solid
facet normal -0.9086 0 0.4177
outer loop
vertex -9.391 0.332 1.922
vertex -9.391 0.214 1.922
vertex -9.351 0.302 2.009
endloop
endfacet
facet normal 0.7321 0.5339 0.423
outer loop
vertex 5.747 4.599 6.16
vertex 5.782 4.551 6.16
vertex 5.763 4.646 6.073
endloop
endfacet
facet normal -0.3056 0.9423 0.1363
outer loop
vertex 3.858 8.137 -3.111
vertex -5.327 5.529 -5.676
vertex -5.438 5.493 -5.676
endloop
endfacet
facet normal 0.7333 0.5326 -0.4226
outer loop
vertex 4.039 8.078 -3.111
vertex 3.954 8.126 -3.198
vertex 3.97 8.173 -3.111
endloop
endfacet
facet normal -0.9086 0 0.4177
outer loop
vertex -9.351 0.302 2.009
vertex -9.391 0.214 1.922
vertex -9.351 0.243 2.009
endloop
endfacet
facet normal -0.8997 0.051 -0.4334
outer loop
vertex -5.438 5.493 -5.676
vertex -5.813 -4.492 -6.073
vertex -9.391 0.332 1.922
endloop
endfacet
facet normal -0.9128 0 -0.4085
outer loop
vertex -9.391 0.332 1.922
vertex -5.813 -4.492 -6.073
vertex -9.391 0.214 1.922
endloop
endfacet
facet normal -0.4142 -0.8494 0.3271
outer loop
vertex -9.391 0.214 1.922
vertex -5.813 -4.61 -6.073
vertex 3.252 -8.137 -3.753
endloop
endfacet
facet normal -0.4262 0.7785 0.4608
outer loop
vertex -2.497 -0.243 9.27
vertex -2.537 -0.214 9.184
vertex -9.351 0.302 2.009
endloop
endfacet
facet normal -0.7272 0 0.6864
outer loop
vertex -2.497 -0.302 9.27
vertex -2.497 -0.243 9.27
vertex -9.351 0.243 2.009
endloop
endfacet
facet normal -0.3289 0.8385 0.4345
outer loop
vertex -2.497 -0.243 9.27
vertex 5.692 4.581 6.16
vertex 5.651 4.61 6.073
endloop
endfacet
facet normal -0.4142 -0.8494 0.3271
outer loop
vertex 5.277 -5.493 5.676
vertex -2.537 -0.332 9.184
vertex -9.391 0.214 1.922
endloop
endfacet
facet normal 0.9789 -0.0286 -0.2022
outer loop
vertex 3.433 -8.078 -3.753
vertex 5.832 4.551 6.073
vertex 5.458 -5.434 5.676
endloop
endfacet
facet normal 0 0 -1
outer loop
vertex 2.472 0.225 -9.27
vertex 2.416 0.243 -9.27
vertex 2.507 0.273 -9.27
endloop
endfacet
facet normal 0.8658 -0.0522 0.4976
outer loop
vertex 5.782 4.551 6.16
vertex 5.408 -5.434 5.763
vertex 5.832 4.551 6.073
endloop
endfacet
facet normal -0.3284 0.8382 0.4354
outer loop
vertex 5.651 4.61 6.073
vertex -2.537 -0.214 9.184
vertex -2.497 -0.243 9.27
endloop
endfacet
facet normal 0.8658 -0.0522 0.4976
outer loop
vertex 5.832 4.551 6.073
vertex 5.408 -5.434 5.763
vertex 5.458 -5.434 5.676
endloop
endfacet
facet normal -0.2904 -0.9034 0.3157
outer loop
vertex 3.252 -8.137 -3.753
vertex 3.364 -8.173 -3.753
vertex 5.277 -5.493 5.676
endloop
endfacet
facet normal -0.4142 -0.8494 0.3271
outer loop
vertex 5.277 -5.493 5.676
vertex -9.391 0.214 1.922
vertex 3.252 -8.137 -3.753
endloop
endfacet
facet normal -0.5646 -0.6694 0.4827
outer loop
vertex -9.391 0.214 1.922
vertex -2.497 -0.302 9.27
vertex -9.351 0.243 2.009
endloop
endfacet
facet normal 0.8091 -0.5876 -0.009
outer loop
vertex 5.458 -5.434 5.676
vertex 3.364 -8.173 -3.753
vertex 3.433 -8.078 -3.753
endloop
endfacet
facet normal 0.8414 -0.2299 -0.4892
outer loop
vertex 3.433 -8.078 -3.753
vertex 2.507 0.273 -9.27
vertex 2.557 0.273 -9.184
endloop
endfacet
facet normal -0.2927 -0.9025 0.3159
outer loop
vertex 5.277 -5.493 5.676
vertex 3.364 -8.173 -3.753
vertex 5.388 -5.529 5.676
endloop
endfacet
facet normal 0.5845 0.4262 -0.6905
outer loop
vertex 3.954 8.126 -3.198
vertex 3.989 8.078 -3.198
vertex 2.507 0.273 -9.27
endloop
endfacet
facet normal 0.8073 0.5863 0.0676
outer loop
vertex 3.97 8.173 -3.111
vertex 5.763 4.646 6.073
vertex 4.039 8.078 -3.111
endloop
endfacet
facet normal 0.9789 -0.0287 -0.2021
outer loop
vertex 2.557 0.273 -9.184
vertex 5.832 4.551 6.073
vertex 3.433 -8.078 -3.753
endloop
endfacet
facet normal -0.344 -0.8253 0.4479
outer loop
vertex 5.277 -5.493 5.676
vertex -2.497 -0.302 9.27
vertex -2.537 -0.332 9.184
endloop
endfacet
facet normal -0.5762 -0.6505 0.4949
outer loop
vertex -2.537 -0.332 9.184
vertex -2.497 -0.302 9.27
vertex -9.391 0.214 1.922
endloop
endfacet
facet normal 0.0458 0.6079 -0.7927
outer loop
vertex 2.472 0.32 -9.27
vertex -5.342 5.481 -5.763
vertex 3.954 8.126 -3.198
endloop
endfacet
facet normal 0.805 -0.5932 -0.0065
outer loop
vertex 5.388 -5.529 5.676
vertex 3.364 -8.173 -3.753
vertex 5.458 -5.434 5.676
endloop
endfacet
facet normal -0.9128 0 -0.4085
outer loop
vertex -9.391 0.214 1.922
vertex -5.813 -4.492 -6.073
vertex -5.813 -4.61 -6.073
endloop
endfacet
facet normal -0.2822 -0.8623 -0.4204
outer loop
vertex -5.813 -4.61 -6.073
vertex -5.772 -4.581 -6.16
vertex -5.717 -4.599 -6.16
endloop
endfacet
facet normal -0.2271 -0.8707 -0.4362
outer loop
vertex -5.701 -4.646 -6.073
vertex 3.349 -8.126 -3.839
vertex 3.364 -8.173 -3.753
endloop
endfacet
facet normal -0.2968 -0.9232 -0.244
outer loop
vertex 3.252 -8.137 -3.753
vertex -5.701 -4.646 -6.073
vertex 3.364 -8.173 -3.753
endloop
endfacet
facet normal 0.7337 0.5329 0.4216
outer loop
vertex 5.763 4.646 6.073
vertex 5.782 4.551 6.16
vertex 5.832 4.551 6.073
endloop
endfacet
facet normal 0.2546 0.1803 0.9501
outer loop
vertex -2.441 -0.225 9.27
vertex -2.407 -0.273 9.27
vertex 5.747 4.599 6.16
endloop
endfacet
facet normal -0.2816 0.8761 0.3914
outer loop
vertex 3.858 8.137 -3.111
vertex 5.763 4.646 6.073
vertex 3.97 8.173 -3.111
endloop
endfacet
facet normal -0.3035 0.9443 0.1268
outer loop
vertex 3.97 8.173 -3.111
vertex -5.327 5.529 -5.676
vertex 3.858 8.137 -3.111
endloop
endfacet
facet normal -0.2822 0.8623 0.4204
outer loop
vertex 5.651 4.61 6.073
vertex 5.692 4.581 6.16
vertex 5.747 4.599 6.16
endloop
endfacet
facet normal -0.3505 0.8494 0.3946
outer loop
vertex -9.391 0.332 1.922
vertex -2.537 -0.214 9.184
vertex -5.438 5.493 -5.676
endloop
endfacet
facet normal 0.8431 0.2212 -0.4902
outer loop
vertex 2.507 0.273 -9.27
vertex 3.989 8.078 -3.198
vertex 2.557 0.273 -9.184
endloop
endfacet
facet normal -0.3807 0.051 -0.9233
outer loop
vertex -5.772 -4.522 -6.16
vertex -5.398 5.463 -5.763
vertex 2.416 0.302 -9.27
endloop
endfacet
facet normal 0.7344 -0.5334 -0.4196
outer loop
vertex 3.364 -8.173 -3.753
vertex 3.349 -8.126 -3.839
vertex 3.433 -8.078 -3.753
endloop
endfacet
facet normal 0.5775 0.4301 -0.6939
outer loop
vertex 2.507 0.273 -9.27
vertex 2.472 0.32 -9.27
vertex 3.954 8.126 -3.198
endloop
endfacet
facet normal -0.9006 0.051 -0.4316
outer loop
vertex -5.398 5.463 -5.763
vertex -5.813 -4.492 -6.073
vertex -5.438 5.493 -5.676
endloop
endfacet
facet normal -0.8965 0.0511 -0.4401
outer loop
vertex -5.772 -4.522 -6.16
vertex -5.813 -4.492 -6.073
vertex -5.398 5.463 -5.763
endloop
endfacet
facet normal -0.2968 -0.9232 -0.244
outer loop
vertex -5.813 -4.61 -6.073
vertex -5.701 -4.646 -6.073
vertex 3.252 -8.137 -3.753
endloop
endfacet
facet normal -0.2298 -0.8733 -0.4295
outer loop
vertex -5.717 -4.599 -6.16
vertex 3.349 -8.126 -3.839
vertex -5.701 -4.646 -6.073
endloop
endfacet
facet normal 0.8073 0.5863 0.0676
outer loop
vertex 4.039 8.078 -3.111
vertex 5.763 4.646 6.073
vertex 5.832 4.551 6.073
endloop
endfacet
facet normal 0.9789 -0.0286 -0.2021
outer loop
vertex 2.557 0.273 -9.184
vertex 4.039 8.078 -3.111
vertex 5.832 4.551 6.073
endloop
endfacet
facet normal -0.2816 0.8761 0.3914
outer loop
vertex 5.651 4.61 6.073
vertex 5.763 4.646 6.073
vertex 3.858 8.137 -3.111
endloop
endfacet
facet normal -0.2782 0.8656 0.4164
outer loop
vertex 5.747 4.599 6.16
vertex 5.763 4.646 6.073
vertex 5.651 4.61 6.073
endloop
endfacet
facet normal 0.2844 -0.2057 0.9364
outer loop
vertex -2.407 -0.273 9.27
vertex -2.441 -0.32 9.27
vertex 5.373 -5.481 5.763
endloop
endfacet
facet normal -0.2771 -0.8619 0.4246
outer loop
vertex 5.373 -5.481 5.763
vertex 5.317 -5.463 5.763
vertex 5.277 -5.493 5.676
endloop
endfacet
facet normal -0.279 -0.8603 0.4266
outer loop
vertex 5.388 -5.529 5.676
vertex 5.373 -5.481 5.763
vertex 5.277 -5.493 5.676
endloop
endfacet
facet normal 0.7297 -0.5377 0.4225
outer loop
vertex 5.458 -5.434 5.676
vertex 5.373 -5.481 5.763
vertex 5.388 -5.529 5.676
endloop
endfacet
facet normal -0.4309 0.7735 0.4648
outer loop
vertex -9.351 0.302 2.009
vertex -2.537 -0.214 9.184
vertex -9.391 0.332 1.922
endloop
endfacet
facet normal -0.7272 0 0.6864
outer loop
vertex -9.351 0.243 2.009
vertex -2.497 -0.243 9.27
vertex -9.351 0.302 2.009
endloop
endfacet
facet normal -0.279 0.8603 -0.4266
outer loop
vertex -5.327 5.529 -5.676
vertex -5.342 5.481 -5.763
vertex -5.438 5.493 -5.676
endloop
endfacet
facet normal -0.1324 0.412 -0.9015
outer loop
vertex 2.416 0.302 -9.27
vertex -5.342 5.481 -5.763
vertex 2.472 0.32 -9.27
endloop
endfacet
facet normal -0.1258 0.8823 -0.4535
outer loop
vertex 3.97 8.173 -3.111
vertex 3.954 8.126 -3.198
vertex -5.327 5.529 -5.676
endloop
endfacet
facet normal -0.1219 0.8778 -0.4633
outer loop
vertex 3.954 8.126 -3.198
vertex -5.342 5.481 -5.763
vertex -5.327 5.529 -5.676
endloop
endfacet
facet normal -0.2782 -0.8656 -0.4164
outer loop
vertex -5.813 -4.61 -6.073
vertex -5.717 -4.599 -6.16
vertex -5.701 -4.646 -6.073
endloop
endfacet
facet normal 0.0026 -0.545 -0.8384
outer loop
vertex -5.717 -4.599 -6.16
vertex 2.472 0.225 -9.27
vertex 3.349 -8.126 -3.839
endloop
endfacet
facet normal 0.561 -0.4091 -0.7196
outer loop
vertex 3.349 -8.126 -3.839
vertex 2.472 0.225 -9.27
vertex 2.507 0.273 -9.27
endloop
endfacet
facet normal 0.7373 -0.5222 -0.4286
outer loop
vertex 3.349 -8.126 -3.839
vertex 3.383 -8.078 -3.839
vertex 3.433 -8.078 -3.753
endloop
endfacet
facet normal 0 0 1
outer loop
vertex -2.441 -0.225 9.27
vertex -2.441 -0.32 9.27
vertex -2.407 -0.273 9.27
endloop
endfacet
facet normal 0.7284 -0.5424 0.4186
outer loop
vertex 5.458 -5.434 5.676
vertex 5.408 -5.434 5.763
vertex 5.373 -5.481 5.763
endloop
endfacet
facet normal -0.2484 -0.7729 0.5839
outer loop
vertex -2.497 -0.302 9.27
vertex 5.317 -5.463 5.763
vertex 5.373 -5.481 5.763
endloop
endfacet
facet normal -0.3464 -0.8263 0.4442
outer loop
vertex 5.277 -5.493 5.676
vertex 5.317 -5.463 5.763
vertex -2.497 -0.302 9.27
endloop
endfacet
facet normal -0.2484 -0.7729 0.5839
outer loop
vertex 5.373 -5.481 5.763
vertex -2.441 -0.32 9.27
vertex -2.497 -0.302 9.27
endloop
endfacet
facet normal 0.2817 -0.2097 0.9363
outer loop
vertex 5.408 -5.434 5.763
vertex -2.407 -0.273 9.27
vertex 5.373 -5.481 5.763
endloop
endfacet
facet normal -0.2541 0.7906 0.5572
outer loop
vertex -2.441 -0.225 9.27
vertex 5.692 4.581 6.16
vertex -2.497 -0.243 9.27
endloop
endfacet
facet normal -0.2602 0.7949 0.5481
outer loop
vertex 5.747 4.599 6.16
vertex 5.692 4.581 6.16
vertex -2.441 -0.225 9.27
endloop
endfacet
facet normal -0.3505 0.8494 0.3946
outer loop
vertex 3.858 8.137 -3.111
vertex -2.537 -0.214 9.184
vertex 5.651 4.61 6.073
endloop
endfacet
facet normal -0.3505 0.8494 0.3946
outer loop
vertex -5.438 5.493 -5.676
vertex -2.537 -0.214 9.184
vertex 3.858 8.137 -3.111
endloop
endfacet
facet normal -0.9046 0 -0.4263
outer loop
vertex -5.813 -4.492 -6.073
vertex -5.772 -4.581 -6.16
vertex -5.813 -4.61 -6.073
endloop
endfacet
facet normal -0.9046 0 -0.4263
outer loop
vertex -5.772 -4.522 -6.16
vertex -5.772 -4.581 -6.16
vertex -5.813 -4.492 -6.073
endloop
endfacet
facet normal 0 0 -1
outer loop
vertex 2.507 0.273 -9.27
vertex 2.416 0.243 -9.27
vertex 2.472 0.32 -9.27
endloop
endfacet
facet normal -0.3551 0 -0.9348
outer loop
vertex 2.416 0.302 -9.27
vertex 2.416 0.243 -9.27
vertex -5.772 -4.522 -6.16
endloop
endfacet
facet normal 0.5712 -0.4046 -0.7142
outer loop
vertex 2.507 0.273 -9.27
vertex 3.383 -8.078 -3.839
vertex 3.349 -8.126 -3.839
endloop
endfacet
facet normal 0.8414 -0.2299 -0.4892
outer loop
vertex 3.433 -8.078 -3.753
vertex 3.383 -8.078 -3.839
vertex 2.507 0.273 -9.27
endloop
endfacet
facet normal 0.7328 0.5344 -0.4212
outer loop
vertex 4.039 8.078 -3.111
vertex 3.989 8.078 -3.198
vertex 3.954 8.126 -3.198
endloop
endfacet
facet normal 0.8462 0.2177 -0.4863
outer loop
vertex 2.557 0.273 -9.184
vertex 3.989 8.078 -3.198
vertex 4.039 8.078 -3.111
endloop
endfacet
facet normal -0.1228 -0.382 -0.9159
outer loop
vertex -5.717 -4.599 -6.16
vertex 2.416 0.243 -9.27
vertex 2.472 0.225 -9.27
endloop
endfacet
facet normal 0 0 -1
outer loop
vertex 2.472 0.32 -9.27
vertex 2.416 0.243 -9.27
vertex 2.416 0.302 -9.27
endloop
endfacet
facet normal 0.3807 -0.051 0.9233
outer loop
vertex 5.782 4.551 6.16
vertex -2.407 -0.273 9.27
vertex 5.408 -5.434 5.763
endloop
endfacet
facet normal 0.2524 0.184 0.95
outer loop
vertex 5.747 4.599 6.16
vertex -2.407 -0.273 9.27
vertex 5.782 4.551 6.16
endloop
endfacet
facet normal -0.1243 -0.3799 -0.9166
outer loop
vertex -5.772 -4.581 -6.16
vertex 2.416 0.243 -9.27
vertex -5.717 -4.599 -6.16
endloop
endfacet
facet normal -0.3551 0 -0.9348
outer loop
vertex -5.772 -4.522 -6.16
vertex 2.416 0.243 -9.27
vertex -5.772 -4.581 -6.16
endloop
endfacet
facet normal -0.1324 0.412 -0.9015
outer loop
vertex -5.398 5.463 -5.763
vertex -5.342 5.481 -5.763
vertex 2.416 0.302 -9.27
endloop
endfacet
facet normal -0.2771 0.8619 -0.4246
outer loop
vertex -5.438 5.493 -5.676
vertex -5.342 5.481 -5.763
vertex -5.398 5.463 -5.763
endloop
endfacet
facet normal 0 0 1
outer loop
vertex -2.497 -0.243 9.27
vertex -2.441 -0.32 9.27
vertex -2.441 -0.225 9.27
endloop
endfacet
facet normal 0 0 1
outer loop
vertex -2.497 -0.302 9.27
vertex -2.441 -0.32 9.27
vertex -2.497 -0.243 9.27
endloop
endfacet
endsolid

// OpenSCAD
// Auto-generated OpenSCAD file

    inner_points = 10*[[0.5357591741651873, -0.543383530882565, 0.5676309916995522], [-0.5731986516605712, -0.45512777948624156, -0.6072977089606933], [0.5731986515218852, 0.45512777955762335, 0.6072977089606933], [-0.5357591743038732, 0.5433835309539468, -0.5676309916995522], [0.3333250709014692, -0.8078126191713554, -0.3752887774762634], [0.3939034177856385, 0.8078126192720669, -0.31110668072560493], [-0.2456533920977693, -0.027272527020831643, 0.9183785262299818], [-0.9310270205482738, 0.02727252704475715, 0.19223265486419908], [0.24565339195908334, 0.027272527092213467, -0.9183785262299818]];

    outer_points = 10*[[-0.3333250709381238, 0.8078126192179577, -0.37528877748181], [-0.39390341794565986, -0.8078126192179577, -0.31110668065861835], [0.39390341794565986, 0.8078126192179577, 0.31110668065861835], [0.3333250709381238, -0.8078126192179577, 0.37528877748181], [-0.9310270204929976, 0.027272527075261566, -0.19223265478667906], [0.24565339210818965, 0.027272527075261566, 0.9183785262080897], [0.5731986515762008, 0.45512777945089933, -0.6072977090281112], [0.5357591741432581, -0.5433835309846493, -0.5676309917221422], [-0.5731986515762008, -0.45512777945089933, 0.6072977090281112]];

    // Convex hull for inner set (I)
    module inner_hull() {
        hull() {
            for (p = inner_points) {
                translate(p) sphere(r=0.1);
            }
        }
    }

    // Convex hull for outer set (O) minus inner hull (O \ I)
    module outer_minus_inner() {
        difference() {
            hull() {
                for (p = outer_points) {
                    translate(p) sphere(r=0.1);
                }
            }
            inner_hull(); // Subtract inner hull
        }
    }

    // Convex hull for outer set (O) minus all translated inner hulls
    module outer_minus_AllTranslationInner() {
        difference() {
            hull() {
                for (p = outer_points) {
                    translate(p) sphere(r=0.1);
                }
            }
            hull() {
                translate([0,0,50]) inner_hull();
                translate([0,0,-50]) inner_hull();
            }; // Subtract translated inner hulls
        }
    }

    // Difference between outer_minus_inner and outer_minus_AllTranslationInner
    module outer_minus_inner_diff() {
        difference() {
            // Outer minus inner
            difference() {
                hull() {
                    for (p = outer_points) {
                        translate(p) sphere(r=0.1);
                    }
                }
                inner_hull();
            }

            // Subtract Outer minus AllTranslationInner
            difference() {
                hull() {
                    for (p = outer_points) {
                        translate(p) sphere(r=0.1);
                    }
                }
                hull() {
                    translate([0,0,50]) inner_hull();
                    translate([0,0,-50]) inner_hull();
                };
            }
        }
    }

    // Rendering all with colors applied
    color([1, 0, 0, 0.5]) inner_hull(); // Transparent red
    
